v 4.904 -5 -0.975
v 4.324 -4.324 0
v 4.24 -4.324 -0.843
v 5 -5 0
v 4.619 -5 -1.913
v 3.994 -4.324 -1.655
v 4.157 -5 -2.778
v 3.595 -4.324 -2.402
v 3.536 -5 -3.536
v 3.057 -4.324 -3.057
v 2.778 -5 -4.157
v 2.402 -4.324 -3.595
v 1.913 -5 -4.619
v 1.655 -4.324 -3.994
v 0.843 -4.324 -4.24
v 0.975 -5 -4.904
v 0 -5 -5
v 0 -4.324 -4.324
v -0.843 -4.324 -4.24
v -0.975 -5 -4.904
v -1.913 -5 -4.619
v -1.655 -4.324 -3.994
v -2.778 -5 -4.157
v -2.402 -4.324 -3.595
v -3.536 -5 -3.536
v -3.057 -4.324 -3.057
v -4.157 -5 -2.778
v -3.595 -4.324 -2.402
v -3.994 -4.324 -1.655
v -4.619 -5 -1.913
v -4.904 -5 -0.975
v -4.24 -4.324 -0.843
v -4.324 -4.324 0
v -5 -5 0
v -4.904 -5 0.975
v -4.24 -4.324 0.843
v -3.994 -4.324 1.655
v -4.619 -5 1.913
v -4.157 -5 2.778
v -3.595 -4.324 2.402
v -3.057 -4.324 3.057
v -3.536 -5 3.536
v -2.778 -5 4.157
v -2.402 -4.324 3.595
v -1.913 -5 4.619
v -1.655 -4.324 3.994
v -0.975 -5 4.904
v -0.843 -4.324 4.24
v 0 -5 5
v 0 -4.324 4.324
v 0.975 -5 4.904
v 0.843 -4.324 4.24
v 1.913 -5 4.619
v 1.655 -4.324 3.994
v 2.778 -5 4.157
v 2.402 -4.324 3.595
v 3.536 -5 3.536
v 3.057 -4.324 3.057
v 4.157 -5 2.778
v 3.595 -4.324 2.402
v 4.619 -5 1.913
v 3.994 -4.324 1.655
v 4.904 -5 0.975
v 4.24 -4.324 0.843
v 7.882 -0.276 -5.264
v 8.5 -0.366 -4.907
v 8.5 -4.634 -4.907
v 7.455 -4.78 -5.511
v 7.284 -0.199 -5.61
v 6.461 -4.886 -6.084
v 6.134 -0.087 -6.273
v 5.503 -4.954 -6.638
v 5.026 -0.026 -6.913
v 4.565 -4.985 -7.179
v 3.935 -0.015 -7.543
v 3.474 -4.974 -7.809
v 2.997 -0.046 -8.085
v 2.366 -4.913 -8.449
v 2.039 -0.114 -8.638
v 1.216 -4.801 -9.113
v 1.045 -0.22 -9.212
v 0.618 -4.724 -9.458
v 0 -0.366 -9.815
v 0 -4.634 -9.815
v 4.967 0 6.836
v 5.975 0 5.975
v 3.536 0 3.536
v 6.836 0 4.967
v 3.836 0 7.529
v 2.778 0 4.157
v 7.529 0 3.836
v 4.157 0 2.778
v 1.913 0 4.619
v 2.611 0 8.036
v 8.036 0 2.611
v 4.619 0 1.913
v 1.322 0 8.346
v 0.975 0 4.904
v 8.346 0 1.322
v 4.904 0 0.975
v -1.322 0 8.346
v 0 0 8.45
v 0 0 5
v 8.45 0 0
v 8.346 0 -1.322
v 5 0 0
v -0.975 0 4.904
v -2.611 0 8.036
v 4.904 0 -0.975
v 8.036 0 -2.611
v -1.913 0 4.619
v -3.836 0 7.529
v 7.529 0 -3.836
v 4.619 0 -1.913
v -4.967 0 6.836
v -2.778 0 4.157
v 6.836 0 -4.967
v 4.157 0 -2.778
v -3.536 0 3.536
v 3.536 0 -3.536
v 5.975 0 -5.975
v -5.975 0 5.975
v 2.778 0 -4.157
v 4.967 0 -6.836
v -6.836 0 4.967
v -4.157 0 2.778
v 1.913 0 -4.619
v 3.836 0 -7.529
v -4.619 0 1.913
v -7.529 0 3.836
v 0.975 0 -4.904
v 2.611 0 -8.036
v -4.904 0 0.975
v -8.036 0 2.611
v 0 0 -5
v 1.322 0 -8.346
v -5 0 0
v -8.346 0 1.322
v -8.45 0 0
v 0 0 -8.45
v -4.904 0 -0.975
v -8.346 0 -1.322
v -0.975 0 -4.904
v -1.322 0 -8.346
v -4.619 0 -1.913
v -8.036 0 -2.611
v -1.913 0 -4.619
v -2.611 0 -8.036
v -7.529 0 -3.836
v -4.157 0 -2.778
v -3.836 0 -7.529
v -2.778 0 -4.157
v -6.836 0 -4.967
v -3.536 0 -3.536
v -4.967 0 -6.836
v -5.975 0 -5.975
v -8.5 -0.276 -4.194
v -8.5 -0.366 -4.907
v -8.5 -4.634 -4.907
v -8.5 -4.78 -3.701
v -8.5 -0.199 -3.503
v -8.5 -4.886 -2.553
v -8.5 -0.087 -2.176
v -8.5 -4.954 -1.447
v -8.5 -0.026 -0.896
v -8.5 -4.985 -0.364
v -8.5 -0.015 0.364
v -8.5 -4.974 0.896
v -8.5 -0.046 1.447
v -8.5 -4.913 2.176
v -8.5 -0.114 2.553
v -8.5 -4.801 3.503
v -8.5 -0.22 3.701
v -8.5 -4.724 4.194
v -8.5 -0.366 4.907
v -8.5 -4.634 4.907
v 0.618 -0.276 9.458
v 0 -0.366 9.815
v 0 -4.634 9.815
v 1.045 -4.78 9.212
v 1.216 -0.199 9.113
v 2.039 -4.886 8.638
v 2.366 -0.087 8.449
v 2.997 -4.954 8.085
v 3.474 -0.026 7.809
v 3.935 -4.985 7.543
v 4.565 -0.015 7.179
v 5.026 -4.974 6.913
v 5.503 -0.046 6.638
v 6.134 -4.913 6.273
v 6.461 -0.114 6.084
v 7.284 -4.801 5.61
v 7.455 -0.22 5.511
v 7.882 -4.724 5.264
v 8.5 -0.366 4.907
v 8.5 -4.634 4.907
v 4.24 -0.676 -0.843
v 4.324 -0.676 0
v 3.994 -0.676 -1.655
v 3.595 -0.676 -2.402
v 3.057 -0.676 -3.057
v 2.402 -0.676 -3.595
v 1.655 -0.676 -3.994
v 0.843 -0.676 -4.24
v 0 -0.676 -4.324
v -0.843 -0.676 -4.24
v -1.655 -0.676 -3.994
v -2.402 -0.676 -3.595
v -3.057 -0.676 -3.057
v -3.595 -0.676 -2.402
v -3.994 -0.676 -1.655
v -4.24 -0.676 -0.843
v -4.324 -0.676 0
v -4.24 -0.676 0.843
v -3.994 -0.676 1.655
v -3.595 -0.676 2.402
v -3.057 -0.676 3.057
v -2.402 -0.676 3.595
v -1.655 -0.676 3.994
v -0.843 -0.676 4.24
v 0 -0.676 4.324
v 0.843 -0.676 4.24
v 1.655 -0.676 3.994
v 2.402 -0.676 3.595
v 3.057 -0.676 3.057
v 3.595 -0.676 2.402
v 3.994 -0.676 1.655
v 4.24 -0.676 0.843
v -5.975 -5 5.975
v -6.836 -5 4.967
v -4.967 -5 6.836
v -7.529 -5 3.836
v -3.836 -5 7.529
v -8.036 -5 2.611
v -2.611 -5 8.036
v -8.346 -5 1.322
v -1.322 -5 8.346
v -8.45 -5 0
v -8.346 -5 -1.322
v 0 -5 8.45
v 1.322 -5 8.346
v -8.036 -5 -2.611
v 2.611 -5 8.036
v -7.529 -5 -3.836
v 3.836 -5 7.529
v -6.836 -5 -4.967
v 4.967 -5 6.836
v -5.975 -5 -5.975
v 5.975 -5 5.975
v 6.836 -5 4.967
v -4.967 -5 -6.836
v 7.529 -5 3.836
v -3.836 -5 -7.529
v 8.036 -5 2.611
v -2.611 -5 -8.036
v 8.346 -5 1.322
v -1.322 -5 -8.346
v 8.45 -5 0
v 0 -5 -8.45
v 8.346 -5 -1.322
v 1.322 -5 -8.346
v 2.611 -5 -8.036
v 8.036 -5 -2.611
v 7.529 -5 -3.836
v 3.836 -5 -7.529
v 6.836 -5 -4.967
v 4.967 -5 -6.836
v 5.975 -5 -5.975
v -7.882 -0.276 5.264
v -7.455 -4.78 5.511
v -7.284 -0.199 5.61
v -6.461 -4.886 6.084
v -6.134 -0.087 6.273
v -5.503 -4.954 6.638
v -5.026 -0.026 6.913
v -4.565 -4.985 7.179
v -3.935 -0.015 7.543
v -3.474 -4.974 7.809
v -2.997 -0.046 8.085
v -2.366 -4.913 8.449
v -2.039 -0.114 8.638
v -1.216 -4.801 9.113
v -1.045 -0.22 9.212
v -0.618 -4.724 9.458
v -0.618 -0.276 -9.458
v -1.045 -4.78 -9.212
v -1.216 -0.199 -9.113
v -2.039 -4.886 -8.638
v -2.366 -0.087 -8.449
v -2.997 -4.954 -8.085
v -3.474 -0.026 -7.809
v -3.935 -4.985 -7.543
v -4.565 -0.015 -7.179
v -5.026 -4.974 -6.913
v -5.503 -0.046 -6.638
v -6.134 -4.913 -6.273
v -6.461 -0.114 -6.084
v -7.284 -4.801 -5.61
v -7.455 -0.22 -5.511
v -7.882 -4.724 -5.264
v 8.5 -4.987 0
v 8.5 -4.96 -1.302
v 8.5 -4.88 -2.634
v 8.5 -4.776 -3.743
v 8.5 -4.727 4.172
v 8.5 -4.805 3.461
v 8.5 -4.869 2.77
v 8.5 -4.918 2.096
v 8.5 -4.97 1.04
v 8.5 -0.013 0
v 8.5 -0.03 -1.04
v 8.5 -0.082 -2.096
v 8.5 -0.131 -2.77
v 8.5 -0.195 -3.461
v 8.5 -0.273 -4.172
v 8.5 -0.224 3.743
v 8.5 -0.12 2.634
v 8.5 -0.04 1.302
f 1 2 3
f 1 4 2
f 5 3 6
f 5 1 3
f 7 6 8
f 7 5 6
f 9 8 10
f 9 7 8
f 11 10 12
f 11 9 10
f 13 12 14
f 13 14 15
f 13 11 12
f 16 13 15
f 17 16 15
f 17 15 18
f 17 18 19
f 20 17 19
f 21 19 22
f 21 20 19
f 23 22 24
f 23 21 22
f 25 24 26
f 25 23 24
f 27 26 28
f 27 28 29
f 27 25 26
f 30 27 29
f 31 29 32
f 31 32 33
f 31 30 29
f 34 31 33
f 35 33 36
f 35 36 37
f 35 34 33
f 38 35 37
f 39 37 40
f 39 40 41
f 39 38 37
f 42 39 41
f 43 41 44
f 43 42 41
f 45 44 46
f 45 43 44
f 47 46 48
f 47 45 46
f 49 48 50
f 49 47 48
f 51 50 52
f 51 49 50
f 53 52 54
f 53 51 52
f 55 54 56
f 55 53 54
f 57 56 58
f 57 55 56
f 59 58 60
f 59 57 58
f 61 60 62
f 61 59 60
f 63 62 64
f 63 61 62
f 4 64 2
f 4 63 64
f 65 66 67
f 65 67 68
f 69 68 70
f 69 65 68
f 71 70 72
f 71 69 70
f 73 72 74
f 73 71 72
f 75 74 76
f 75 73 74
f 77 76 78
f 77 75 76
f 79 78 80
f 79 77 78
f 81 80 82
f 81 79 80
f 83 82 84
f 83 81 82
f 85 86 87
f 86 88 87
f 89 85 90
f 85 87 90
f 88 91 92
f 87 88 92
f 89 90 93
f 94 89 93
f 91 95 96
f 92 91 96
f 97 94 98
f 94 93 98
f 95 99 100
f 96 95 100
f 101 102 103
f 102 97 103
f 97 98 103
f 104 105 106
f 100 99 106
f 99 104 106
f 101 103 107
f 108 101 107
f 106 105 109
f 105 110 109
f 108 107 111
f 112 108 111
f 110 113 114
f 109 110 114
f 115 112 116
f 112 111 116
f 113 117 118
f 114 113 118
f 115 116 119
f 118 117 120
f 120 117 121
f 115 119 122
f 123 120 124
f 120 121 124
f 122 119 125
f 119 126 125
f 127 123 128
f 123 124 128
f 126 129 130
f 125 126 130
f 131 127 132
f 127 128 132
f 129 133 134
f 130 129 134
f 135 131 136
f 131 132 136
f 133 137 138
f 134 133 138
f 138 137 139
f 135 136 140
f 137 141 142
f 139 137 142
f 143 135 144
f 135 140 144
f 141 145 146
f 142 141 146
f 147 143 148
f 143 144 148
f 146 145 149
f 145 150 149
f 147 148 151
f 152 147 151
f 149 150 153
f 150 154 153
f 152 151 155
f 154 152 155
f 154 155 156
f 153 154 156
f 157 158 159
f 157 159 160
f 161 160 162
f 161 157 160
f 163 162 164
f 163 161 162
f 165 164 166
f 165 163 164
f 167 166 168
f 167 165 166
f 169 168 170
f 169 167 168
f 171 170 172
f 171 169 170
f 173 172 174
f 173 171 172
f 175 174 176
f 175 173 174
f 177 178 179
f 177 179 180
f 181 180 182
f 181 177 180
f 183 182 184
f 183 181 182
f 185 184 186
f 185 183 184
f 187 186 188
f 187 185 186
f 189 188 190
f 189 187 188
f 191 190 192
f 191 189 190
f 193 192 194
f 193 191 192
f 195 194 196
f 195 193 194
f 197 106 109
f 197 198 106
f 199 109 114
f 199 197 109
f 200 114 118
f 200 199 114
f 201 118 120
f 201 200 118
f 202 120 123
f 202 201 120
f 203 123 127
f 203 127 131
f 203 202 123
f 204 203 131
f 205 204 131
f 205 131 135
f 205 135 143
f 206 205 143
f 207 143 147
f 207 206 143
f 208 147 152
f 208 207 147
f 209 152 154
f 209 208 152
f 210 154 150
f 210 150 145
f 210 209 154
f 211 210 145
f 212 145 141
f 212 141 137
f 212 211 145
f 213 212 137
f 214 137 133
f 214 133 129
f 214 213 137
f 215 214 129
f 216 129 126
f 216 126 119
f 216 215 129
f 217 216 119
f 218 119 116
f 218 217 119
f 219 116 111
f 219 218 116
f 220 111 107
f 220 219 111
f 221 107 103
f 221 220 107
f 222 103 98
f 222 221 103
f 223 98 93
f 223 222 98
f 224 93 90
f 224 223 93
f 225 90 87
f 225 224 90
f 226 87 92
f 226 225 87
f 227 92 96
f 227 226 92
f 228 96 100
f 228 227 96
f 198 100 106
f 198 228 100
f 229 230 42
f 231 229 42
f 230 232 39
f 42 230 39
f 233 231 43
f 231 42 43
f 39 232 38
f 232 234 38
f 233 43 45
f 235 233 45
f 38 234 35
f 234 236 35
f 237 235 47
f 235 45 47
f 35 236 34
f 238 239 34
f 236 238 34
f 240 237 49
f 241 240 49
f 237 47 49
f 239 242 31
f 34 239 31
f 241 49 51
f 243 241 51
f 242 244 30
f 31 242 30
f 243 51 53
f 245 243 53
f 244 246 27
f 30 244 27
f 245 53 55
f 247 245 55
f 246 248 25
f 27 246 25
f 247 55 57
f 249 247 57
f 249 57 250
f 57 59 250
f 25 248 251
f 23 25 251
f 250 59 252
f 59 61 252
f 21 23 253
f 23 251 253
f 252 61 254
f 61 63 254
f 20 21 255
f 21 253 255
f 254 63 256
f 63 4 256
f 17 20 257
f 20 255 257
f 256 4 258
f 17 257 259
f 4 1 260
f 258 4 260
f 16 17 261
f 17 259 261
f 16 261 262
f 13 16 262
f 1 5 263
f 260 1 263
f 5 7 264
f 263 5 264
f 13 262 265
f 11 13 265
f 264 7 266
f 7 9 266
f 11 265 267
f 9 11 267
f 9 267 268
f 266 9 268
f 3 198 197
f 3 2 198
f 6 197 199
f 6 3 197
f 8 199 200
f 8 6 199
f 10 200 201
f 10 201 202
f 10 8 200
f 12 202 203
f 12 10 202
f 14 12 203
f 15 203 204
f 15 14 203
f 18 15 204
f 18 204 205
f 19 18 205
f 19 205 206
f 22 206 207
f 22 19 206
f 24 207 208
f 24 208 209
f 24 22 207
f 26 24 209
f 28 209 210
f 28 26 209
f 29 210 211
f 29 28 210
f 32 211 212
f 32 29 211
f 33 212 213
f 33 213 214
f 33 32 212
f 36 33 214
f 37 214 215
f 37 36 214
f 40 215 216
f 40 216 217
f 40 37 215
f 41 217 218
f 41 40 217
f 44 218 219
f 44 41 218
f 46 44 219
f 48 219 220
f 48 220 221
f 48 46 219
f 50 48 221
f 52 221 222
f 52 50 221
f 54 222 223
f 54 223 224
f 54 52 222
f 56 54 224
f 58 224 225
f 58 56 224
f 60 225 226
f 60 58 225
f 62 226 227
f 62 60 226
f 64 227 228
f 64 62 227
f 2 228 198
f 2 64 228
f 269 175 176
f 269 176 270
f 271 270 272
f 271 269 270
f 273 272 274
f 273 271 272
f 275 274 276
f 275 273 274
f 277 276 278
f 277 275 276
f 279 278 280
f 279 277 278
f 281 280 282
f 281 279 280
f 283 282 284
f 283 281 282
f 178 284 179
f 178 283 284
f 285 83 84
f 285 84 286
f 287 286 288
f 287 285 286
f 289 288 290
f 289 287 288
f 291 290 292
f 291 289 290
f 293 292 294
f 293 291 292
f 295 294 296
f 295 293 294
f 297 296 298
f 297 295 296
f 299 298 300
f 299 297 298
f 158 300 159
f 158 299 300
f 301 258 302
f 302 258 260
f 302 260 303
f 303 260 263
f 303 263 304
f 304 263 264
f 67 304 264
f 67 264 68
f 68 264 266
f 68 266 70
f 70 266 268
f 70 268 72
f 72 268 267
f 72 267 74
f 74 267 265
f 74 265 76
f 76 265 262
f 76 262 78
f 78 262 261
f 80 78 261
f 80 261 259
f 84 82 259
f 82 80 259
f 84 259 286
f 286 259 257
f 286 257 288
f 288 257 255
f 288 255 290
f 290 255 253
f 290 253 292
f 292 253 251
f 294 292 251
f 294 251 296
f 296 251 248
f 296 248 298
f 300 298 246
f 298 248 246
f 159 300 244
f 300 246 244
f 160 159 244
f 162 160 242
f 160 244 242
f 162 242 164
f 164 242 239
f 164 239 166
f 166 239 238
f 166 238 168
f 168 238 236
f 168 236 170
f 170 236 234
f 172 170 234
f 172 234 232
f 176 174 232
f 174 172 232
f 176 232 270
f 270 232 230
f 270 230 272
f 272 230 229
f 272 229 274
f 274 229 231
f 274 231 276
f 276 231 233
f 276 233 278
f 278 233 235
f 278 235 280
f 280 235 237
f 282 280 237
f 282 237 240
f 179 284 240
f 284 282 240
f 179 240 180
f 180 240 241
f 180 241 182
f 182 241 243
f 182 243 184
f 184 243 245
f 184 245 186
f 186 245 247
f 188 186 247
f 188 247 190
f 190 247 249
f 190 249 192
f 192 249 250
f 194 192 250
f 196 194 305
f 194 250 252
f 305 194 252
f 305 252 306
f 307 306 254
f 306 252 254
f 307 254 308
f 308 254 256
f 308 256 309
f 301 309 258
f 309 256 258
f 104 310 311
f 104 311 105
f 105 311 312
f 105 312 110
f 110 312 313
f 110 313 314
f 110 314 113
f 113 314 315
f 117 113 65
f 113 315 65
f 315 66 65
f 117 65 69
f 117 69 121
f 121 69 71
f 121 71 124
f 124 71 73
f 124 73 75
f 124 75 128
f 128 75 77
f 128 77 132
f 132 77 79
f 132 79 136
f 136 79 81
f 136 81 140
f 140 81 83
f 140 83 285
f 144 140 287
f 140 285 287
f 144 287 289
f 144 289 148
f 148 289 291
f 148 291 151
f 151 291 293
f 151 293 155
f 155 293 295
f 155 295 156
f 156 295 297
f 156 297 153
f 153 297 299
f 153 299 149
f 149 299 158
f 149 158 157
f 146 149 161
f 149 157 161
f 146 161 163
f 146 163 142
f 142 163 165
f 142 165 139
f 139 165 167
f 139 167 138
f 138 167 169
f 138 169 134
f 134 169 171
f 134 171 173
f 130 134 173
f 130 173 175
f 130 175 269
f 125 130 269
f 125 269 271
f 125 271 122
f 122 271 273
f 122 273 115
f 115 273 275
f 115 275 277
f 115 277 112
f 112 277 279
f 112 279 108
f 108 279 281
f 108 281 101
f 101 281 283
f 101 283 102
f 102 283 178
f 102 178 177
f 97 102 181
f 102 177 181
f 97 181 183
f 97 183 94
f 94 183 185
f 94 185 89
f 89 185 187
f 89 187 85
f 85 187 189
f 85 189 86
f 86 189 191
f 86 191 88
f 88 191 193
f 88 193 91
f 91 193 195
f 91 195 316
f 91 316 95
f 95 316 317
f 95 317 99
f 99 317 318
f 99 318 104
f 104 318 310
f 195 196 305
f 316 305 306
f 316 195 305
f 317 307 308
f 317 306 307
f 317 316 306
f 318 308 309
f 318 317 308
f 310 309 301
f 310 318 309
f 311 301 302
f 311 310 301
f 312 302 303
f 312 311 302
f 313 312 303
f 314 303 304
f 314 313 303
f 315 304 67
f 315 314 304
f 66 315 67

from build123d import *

# Parameters (mm, degrees)
CUT_EXTRUDE1_DEPTH      = 6
CUT_EXTRUDE1_DEPTH_BACK = 6
SKETCH2_W               = 68
SKETCH2_H               = 68


with BuildPart() as part:
    # Sketch1 → Revolve1 (revolve)
    with BuildSketch(Plane.XY):
        Polygon((0, 0), (8.45, 0), (17.780127019, -2.5), (8.45, -5), (0, -5), align=None)
    revolve(axis=Axis((0, -5, 0), (0, 1, 0)))

    # Sketch2 → Cut-Extrude1 (cut, two sides: drawn at the far end of the back side and taken through both)
    with BuildSketch(Plane(origin=(0, 0, 0), x_dir=(1, 0, 0), z_dir=(0, 1, 0)).offset(-CUT_EXTRUDE1_DEPTH_BACK)):
        Rectangle(SKETCH2_W, SKETCH2_H)
        Polygon((-8.5, -4.907477288), (0, -9.814954576), (8.5, -4.907477288), (8.5, 4.907477288), (0, 9.814954576), (-8.5, 4.907477288), align=None, mode=Mode.SUBTRACT)
    extrude(amount=CUT_EXTRUDE1_DEPTH + CUT_EXTRUDE1_DEPTH_BACK, mode=Mode.SUBTRACT)

    # Sketch3 → Cut-Revolve1 (revolve, cut)
    with BuildSketch(Plane.XY):
        Polygon((0, 0), (5, 0), (4.3235, -0.6765), (4.3235, -4.3235), (5, -5), (0, -5), align=None)
    revolve(axis=Axis((0, -5, 0), (0, 1, 0)), mode=Mode.SUBTRACT)


solid = part.part
